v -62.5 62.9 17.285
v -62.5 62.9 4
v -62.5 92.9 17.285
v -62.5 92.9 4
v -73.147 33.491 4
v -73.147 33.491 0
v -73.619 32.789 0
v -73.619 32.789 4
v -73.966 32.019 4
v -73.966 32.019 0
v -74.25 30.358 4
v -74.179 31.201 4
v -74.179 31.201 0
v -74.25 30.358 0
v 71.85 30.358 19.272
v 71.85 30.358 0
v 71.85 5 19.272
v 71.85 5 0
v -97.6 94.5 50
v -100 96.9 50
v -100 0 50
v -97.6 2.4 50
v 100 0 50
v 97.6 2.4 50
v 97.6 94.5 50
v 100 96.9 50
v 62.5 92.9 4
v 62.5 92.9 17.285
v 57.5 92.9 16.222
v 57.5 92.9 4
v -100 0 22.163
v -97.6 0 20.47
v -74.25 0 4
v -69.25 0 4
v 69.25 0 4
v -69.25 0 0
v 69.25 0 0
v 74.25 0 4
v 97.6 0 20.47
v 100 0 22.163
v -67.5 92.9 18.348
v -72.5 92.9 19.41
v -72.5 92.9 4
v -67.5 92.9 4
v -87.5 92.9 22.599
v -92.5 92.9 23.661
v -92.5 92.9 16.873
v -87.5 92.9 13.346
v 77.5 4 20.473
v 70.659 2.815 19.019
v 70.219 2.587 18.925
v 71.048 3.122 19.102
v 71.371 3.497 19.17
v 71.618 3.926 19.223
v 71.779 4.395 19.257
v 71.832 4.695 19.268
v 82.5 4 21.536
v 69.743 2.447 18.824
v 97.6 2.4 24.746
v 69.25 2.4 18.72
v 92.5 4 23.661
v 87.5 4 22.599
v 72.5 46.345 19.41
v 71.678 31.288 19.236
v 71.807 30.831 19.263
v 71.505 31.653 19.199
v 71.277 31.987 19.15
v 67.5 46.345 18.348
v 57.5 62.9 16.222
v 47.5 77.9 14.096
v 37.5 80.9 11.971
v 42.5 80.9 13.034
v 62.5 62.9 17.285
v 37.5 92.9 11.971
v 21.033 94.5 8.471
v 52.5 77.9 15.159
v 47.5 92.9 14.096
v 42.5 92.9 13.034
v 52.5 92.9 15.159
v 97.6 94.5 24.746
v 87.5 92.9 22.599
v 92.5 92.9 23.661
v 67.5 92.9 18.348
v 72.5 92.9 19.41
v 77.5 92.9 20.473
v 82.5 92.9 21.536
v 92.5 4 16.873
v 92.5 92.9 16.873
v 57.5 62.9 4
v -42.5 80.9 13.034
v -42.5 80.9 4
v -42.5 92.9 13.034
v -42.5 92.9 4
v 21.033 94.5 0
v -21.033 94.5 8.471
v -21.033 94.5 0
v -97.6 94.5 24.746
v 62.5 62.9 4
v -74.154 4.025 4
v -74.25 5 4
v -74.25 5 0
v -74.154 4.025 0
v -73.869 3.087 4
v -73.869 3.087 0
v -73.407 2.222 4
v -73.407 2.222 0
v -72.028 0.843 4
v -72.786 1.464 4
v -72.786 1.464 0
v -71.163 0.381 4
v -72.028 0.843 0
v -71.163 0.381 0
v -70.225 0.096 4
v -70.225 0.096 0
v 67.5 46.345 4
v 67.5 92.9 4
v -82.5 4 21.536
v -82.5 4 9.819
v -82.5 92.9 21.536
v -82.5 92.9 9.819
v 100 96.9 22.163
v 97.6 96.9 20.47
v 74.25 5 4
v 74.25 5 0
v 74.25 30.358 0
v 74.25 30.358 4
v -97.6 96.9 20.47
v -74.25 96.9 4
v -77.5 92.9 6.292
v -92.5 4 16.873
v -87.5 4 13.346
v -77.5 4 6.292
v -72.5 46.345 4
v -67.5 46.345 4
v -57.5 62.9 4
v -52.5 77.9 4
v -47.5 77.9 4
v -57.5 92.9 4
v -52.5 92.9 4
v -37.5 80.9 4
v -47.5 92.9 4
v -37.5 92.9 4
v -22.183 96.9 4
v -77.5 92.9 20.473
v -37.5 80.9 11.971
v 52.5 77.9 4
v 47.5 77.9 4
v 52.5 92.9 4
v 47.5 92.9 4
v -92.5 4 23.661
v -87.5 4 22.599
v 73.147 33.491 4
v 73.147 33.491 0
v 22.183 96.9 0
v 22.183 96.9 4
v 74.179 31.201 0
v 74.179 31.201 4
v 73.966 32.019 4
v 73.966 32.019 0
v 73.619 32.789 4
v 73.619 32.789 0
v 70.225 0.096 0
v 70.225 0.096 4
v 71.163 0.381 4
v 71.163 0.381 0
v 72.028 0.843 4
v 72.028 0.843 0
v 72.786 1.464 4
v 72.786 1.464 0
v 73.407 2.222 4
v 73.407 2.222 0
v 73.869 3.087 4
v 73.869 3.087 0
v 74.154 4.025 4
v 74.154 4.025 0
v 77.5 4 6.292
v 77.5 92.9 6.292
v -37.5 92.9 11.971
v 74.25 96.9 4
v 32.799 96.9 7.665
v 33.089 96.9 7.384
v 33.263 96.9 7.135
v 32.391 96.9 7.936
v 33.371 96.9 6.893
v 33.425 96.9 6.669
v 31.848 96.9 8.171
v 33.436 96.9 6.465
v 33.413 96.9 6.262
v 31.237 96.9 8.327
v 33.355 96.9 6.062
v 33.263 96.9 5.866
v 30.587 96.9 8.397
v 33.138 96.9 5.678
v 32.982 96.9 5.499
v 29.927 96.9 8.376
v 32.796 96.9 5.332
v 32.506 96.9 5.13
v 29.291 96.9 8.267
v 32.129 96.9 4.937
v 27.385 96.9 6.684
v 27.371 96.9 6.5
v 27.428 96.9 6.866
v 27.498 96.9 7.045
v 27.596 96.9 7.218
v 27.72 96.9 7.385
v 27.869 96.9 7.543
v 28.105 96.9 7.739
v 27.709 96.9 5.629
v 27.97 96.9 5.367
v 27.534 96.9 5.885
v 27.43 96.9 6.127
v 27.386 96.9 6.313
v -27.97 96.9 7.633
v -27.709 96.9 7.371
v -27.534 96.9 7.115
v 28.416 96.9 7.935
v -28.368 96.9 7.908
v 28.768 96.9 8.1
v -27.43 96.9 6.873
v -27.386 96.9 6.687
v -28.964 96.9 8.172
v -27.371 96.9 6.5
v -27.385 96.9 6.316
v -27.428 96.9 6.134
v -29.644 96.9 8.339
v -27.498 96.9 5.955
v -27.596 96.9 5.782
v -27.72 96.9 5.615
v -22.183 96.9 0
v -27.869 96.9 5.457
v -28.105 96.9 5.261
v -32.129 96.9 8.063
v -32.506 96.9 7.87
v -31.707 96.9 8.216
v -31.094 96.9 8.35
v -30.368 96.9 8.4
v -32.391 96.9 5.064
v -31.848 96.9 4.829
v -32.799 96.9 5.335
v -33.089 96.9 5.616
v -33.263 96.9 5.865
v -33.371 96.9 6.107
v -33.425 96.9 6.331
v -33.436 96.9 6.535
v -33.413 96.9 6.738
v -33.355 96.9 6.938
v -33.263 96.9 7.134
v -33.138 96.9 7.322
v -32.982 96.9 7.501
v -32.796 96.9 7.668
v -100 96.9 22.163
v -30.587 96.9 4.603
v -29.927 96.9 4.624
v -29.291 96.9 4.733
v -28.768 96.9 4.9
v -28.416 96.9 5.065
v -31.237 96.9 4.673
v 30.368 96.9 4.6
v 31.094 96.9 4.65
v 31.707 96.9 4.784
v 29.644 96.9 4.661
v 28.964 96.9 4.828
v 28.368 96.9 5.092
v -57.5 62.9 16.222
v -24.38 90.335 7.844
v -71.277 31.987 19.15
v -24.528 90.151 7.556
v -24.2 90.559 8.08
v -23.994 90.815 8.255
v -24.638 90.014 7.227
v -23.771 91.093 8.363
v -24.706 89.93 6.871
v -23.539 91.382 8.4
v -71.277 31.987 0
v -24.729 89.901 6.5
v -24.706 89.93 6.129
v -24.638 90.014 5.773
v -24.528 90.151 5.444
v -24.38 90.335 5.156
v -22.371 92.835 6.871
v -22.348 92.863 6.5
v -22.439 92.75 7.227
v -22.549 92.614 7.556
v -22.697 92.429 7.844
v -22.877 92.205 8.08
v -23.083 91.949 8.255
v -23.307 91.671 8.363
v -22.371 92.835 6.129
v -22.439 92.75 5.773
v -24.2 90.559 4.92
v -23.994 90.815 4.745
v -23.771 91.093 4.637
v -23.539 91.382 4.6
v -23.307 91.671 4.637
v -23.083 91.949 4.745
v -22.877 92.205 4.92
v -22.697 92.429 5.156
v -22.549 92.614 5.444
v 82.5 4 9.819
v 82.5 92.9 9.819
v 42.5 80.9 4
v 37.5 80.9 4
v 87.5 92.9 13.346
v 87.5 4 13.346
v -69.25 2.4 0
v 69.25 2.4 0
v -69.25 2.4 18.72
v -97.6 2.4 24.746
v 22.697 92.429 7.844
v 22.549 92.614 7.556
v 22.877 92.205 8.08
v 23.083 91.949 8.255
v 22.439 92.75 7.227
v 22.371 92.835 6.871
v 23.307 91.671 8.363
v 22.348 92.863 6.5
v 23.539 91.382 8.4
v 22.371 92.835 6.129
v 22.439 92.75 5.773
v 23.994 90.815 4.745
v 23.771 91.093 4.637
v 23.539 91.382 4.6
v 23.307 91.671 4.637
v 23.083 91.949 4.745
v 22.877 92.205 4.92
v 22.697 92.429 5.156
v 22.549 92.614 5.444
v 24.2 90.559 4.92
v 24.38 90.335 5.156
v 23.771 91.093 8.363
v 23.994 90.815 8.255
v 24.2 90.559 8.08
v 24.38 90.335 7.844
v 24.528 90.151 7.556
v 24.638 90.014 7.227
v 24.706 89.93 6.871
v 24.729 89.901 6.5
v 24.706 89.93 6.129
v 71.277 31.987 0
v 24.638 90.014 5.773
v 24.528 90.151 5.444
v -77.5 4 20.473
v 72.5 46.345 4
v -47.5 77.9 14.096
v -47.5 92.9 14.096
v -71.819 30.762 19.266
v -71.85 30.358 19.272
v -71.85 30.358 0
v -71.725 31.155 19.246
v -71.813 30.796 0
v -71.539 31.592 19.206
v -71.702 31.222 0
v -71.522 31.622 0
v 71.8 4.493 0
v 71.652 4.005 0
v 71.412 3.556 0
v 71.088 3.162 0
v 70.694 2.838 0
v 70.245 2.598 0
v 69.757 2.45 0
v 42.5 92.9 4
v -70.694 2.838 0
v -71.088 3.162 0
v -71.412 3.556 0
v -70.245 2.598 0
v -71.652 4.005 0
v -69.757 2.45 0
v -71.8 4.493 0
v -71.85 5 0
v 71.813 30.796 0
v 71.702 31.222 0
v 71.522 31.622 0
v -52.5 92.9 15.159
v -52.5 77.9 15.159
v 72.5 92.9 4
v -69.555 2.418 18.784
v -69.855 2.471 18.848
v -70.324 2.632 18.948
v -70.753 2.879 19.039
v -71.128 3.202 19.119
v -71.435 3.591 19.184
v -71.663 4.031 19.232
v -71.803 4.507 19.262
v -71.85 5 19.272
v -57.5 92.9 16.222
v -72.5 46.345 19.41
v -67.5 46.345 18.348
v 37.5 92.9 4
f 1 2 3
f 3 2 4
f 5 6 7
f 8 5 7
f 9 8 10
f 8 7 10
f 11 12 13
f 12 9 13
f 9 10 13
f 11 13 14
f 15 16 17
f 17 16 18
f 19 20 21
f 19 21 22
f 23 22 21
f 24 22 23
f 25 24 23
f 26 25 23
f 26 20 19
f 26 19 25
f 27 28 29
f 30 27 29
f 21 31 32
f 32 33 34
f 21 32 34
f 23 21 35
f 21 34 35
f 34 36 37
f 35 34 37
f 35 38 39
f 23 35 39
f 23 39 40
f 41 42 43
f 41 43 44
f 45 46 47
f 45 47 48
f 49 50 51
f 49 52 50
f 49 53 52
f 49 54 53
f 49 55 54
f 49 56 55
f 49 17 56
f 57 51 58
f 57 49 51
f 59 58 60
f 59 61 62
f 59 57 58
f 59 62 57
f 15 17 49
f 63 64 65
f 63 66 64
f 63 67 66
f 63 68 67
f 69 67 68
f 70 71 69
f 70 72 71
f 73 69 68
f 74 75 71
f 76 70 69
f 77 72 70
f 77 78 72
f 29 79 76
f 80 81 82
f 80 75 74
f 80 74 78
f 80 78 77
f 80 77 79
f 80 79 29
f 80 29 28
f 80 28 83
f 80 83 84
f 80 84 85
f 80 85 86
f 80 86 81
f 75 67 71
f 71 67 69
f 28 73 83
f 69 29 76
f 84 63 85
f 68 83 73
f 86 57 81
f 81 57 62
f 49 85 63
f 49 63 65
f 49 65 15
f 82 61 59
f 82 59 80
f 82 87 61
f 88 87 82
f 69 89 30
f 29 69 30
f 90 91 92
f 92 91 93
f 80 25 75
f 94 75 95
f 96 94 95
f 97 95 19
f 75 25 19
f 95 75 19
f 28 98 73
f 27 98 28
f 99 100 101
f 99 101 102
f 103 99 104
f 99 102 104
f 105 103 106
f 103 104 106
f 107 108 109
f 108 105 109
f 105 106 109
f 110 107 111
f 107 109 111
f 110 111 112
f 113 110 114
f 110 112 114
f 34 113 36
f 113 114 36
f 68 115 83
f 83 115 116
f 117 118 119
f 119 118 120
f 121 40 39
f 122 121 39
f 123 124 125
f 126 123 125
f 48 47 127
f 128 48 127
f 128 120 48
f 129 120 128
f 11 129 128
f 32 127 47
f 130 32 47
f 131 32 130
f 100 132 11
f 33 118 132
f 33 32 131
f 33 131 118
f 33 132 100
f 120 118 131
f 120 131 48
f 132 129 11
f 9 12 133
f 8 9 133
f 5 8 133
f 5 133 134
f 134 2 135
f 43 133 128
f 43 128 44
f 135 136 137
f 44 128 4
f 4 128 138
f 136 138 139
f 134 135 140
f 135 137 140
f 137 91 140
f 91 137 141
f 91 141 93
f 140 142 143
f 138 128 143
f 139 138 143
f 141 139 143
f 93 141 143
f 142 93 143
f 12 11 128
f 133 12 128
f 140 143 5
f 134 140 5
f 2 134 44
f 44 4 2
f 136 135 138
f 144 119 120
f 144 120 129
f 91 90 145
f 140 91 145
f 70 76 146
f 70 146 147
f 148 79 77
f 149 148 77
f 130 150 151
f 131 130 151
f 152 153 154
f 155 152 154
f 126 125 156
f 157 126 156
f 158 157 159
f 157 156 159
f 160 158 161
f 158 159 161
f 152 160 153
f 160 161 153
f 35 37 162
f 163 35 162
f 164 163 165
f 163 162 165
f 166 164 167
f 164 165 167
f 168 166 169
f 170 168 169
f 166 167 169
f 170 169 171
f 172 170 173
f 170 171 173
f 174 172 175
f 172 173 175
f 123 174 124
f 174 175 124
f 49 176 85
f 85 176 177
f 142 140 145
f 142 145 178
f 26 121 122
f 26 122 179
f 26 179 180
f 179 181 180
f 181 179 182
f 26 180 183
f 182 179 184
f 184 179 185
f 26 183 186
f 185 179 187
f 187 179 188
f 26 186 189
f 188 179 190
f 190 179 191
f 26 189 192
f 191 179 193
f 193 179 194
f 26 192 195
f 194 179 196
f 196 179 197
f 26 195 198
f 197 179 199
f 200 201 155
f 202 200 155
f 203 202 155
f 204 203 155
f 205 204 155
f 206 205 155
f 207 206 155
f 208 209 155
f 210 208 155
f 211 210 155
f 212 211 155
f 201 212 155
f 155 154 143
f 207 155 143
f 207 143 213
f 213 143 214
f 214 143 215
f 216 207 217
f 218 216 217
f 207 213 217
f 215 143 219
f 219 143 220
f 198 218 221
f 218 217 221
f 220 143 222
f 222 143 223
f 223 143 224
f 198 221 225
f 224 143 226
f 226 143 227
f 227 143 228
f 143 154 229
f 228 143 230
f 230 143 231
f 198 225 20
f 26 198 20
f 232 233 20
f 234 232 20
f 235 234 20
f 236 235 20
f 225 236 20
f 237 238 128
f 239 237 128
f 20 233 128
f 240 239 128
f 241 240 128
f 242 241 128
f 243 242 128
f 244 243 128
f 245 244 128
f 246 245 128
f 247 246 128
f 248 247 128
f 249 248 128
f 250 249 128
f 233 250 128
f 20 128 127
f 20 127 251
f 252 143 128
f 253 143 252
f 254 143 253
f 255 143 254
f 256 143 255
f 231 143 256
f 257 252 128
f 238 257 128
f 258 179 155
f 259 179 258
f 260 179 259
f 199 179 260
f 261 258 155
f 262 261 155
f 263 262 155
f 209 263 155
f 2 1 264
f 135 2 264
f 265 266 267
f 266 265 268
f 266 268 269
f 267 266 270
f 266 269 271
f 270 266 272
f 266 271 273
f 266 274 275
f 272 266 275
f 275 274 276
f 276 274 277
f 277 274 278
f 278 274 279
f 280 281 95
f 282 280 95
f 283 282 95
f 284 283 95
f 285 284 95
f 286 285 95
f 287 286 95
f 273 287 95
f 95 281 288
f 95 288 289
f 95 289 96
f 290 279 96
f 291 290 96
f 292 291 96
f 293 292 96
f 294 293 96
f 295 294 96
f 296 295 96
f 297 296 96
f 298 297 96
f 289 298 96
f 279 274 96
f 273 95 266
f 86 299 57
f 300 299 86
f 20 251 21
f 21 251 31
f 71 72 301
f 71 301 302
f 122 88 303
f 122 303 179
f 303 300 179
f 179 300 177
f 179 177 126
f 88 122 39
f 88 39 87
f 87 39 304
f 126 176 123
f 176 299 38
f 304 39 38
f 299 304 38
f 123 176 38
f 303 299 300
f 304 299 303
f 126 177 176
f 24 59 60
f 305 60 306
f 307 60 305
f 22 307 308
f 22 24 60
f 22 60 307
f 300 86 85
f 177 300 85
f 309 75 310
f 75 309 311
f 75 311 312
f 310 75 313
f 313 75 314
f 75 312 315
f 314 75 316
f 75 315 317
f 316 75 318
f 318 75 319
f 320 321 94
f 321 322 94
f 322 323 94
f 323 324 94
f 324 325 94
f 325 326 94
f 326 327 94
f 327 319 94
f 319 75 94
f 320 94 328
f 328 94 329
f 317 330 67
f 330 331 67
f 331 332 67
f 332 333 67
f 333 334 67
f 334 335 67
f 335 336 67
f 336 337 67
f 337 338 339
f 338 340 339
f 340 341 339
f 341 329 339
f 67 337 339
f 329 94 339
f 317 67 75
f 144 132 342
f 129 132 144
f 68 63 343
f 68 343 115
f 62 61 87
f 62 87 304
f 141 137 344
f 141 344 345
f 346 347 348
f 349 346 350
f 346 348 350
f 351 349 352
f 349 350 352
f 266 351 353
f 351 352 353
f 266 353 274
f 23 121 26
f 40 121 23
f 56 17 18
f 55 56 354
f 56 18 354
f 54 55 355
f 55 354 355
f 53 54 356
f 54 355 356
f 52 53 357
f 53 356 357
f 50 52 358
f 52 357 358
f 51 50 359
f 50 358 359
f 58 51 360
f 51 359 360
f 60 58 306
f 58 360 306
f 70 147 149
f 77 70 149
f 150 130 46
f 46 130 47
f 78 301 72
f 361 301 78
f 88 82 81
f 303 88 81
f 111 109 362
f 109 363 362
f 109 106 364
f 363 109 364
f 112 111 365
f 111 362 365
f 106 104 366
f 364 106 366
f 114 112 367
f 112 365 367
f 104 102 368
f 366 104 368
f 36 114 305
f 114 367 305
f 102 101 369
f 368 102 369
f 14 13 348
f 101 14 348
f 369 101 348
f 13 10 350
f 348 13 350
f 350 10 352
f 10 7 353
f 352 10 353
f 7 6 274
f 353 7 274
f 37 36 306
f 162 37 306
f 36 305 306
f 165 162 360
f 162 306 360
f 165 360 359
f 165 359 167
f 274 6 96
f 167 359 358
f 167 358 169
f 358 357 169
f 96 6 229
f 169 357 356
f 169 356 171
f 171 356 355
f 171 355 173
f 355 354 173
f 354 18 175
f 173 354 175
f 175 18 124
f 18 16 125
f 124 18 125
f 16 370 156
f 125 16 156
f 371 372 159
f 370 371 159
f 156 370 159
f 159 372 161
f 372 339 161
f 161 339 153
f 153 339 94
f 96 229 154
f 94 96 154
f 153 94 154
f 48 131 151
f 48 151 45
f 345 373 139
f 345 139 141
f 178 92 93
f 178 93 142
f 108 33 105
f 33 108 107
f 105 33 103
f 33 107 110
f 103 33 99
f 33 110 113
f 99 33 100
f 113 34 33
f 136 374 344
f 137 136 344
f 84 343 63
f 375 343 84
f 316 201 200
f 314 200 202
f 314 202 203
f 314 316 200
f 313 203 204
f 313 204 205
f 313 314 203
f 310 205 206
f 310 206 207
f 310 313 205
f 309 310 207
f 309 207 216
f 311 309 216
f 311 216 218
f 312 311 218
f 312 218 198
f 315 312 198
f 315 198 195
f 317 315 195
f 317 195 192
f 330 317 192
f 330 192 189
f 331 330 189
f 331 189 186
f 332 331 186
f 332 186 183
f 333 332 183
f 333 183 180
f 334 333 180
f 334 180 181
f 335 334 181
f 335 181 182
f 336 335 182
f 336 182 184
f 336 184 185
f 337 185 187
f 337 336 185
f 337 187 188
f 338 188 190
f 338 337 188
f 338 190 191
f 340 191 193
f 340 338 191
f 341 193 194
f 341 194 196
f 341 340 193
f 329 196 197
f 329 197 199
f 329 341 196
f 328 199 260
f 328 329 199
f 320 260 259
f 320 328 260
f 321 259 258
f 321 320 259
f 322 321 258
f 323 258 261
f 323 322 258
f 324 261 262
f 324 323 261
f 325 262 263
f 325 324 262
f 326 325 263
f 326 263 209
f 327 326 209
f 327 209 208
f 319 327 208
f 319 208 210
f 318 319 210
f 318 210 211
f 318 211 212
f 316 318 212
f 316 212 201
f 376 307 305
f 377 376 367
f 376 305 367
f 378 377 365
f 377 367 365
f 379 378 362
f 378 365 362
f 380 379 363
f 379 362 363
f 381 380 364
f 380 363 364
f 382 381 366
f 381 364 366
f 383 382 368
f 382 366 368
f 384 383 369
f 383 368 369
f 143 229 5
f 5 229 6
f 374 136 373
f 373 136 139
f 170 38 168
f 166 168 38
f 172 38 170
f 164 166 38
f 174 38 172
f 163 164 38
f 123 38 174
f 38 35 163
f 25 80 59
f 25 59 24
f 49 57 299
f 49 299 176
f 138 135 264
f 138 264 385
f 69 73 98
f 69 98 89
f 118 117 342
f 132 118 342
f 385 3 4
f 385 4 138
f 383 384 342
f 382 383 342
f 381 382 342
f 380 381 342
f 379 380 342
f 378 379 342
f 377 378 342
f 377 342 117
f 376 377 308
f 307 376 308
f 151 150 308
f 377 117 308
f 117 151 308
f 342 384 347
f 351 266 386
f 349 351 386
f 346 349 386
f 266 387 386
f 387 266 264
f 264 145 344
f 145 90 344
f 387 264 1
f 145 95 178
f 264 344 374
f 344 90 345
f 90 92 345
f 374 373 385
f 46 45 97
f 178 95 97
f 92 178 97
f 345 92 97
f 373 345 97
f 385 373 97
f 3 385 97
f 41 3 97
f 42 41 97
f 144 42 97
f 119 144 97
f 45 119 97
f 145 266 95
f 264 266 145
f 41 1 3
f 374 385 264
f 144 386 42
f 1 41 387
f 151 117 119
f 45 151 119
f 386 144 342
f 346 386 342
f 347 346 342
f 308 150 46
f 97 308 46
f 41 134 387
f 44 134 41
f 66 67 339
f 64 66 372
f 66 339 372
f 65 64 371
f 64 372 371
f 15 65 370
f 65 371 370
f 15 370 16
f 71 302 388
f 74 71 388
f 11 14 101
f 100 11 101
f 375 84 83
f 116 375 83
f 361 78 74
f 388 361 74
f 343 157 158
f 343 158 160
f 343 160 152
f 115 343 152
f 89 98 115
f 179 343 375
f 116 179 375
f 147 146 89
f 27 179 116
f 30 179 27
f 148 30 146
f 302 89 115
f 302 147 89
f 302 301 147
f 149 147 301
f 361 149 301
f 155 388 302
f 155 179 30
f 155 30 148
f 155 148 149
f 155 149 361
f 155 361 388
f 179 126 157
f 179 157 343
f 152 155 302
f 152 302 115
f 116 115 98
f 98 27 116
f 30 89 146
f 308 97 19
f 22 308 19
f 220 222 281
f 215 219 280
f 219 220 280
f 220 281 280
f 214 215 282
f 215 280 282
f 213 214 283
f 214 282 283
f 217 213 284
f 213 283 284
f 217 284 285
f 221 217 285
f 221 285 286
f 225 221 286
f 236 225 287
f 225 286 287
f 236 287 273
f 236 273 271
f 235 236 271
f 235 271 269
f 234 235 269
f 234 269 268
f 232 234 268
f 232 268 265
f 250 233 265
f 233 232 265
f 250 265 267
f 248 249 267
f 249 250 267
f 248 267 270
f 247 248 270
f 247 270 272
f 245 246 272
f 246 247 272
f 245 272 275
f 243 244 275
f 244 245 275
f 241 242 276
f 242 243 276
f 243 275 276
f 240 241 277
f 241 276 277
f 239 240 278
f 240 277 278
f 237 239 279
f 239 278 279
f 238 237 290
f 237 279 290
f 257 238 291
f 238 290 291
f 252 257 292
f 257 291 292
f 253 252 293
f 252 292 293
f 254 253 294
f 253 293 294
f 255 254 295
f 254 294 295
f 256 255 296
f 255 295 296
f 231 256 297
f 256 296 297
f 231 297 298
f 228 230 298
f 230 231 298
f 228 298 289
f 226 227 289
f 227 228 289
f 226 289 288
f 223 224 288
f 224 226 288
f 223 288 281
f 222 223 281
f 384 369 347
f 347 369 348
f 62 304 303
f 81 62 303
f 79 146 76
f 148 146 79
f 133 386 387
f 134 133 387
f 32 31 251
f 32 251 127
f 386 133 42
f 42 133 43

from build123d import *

# Parameters (mm, degrees)
EXTRUDE_1_DEPTH      = 50
EXTRUDE_START        = -4
EXTRUDE_2_DEPTH      = 46
CUT_EXTRUDE_1_DEPTH  = 92.1
CUT_EXTRUDE_START    = 94.5
CUT_EXTRUDE_2_DEPTH  = 241.890744243
SKETCH_17_W          = 5
SKETCH_17_H          = 88.9
SKETCH_17_H_2        = 46.554557274
SKETCH_17_H_3        = 30
SKETCH_17_H_4        = 15
SKETCH_17_H_5        = 12
CUT_EXTRUDE_5_DEPTH  = 30
SKETCH_37_R          = 1.9
CUT_EXTRUDE_13_DEPTH = 174.81246936


with BuildPart() as part:
    # 草图1 → 凸台-拉伸1 (new body)
    with BuildSketch(Plane.XY):
        with BuildLine():
            Line((-22.183039724, 96.9), (-73.14723658, 33.490663373))
            ThreePointArc((-73.14723658, 33.490663373), (-73.966258204, 32.018718559), (-74.25, 30.358324465))
            Line((-74.25, 30.358324465), (-74.25, 5))
            ThreePointArc((-74.25, 5), (-72.785533906, 1.464466094), (-69.25, 0))
            Line((-69.25, 0), (69.25, 0))
            ThreePointArc((69.25, 0), (72.785533906, 1.464466094), (74.25, 5))
            Line((74.25, 5), (74.25, 30.358324465))
            ThreePointArc((74.25, 30.358324465), (73.966258204, 32.018718559), (73.14723658, 33.490663373))
            Line((73.14723658, 33.490663373), (22.183039724, 96.9))
            Line((22.183039724, 96.9), (-22.183039724, 96.9))
        make_face()
        with BuildLine():
            ThreePointArc((-69.25, 2.4), (-71.088477631, 3.161522369), (-71.85, 5))
            Line((-71.85, 5), (-71.85, 30.358324465))
            ThreePointArc((-71.85, 30.358324465), (-71.702454266, 31.221729394), (-71.276563022, 31.987140697))
            Line((-71.276563022, 31.987140697), (-21.032894864, 94.5))
            Line((-21.032894864, 94.5), (21.032894864, 94.5))
            Line((21.032894864, 94.5), (71.276563022, 31.987140697))
            ThreePointArc((71.276563022, 31.987140697), (71.702454266, 31.221729394), (71.85, 30.358324465))
            Line((71.85, 30.358324465), (71.85, 5))
            ThreePointArc((71.85, 5), (71.088477631, 3.161522369), (69.25, 2.4))
            Line((69.25, 2.4), (-69.25, 2.4))
        make_face(mode=Mode.SUBTRACT)
    extrude(amount=EXTRUDE_1_DEPTH)

    # 草图2 → Extrude 2 (add)
    with BuildSketch(Plane(origin=(0, 0, 0), x_dir=(-1, 0, 0), z_dir=(0, 0, -1)).offset(EXTRUDE_START)):
        with BuildLine():
            Line((-100, 96.9), (-100, 0))
            Line((-100, 0), (-69.25, 0))
            ThreePointArc((-69.25, 0), (-72.785533906, 1.464466094), (-74.25, 5))
            Line((-74.25, 5), (-74.25, 30.358324465))
            ThreePointArc((-74.25, 30.358324465), (-73.966258204, 32.018718559), (-73.14723658, 33.490663373))
            Line((-73.14723658, 33.490663373), (-22.183039724, 96.9))
            Line((-22.183039724, 96.9), (-100, 96.9))
        make_face()
    extrude_2 = extrude(amount=-EXTRUDE_2_DEPTH)

    # 草图4 → Cut-Extrude 1 (cut)
    with BuildSketch(Plane.XZ.offset(-94.5)):
        Polygon((21.032894864, 50), (21.032894864, 8.470679814), (97.6, 24.745520419), (97.6, 50), align=None)
    cut_extrude_1 = extrude(amount=CUT_EXTRUDE_1_DEPTH, mode=Mode.SUBTRACT)

    # 草图4<4> → 切除-拉伸2 (cut, through all)
    with BuildSketch(Plane.XZ.offset(-94.5).offset(CUT_EXTRUDE_START)):
        Polygon((97.6, 4), (97.6, 20.470256304), (74.25, 4), align=None)
        Polygon((100, 22.163130613), (97.6, 20.470256304), (97.6, 4), (100, 4), align=None)
    cut_extrude_2 = extrude(amount=-CUT_EXTRUDE_2_DEPTH, mode=Mode.SUBTRACT)

    # 镜向1: Extrude 2, Cut-Extrude 1, 切除-拉伸2 across plane
    add(extrude_2.mirror(Plane(origin=(0, 0, 0), x_dir=(0, 0, 1), z_dir=(1, 0, 0))))
    add(cut_extrude_1.mirror(Plane(origin=(0, 0, 0), x_dir=(0, 0, 1), z_dir=(1, 0, 0))), mode=Mode.SUBTRACT)
    add(cut_extrude_2.mirror(Plane(origin=(0, 0, 0), x_dir=(0, 0, 1), z_dir=(1, 0, 0))), mode=Mode.SUBTRACT)

    # 草图17 → Cut-Extrude 5 (cut)
    with BuildSketch(Plane(origin=(0, 0, 4), x_dir=(-1, 0, 0), z_dir=(0, 0, -1))):
        with Locations((-90, 48.45)):
            Rectangle(SKETCH_17_W, SKETCH_17_H)
        with Locations((-80, 48.45)):
            Rectangle(SKETCH_17_W, SKETCH_17_H)
        with Locations((-70, 69.622721363)):
            Rectangle(SKETCH_17_W, SKETCH_17_H_2)
        with Locations((-60, 77.9)):
            Rectangle(SKETCH_17_W, SKETCH_17_H_3)
        with Locations((-50, 85.4)):
            Rectangle(SKETCH_17_W, SKETCH_17_H_4)
        with Locations((-40, 86.9)):
            Rectangle(SKETCH_17_W, SKETCH_17_H_5)
    cut_extrude_5 = extrude(amount=-CUT_EXTRUDE_5_DEPTH, mode=Mode.SUBTRACT)

    # 镜向2: Cut-Extrude 5 across plane
    add(cut_extrude_5.mirror(Plane(origin=(0, 0, 0), x_dir=(0, 0, 1), z_dir=(1, 0, 0))), mode=Mode.SUBTRACT)

    # 草图37 → 切除-拉伸13 (cut, through all)
    with BuildSketch(Plane(origin=(-58.922506005, 47.35798157, 0), x_dir=(0, 0, -1), z_dir=(0.7794473160570582, -0.6264677816866949, 0))):
        with Locations(Location((-6.5, 56.48134038, 0), (0, 0, 90))):
            Circle(SKETCH_37_R)
    cut_extrude_13 = extrude(amount=-CUT_EXTRUDE_13_DEPTH, mode=Mode.SUBTRACT)

    # 镜向4: 切除-拉伸13 across plane
    add(cut_extrude_13.mirror(Plane(origin=(0, 0, 0), x_dir=(0, 0, 1), z_dir=(1, 0, 0))), mode=Mode.SUBTRACT)


solid = part.part
